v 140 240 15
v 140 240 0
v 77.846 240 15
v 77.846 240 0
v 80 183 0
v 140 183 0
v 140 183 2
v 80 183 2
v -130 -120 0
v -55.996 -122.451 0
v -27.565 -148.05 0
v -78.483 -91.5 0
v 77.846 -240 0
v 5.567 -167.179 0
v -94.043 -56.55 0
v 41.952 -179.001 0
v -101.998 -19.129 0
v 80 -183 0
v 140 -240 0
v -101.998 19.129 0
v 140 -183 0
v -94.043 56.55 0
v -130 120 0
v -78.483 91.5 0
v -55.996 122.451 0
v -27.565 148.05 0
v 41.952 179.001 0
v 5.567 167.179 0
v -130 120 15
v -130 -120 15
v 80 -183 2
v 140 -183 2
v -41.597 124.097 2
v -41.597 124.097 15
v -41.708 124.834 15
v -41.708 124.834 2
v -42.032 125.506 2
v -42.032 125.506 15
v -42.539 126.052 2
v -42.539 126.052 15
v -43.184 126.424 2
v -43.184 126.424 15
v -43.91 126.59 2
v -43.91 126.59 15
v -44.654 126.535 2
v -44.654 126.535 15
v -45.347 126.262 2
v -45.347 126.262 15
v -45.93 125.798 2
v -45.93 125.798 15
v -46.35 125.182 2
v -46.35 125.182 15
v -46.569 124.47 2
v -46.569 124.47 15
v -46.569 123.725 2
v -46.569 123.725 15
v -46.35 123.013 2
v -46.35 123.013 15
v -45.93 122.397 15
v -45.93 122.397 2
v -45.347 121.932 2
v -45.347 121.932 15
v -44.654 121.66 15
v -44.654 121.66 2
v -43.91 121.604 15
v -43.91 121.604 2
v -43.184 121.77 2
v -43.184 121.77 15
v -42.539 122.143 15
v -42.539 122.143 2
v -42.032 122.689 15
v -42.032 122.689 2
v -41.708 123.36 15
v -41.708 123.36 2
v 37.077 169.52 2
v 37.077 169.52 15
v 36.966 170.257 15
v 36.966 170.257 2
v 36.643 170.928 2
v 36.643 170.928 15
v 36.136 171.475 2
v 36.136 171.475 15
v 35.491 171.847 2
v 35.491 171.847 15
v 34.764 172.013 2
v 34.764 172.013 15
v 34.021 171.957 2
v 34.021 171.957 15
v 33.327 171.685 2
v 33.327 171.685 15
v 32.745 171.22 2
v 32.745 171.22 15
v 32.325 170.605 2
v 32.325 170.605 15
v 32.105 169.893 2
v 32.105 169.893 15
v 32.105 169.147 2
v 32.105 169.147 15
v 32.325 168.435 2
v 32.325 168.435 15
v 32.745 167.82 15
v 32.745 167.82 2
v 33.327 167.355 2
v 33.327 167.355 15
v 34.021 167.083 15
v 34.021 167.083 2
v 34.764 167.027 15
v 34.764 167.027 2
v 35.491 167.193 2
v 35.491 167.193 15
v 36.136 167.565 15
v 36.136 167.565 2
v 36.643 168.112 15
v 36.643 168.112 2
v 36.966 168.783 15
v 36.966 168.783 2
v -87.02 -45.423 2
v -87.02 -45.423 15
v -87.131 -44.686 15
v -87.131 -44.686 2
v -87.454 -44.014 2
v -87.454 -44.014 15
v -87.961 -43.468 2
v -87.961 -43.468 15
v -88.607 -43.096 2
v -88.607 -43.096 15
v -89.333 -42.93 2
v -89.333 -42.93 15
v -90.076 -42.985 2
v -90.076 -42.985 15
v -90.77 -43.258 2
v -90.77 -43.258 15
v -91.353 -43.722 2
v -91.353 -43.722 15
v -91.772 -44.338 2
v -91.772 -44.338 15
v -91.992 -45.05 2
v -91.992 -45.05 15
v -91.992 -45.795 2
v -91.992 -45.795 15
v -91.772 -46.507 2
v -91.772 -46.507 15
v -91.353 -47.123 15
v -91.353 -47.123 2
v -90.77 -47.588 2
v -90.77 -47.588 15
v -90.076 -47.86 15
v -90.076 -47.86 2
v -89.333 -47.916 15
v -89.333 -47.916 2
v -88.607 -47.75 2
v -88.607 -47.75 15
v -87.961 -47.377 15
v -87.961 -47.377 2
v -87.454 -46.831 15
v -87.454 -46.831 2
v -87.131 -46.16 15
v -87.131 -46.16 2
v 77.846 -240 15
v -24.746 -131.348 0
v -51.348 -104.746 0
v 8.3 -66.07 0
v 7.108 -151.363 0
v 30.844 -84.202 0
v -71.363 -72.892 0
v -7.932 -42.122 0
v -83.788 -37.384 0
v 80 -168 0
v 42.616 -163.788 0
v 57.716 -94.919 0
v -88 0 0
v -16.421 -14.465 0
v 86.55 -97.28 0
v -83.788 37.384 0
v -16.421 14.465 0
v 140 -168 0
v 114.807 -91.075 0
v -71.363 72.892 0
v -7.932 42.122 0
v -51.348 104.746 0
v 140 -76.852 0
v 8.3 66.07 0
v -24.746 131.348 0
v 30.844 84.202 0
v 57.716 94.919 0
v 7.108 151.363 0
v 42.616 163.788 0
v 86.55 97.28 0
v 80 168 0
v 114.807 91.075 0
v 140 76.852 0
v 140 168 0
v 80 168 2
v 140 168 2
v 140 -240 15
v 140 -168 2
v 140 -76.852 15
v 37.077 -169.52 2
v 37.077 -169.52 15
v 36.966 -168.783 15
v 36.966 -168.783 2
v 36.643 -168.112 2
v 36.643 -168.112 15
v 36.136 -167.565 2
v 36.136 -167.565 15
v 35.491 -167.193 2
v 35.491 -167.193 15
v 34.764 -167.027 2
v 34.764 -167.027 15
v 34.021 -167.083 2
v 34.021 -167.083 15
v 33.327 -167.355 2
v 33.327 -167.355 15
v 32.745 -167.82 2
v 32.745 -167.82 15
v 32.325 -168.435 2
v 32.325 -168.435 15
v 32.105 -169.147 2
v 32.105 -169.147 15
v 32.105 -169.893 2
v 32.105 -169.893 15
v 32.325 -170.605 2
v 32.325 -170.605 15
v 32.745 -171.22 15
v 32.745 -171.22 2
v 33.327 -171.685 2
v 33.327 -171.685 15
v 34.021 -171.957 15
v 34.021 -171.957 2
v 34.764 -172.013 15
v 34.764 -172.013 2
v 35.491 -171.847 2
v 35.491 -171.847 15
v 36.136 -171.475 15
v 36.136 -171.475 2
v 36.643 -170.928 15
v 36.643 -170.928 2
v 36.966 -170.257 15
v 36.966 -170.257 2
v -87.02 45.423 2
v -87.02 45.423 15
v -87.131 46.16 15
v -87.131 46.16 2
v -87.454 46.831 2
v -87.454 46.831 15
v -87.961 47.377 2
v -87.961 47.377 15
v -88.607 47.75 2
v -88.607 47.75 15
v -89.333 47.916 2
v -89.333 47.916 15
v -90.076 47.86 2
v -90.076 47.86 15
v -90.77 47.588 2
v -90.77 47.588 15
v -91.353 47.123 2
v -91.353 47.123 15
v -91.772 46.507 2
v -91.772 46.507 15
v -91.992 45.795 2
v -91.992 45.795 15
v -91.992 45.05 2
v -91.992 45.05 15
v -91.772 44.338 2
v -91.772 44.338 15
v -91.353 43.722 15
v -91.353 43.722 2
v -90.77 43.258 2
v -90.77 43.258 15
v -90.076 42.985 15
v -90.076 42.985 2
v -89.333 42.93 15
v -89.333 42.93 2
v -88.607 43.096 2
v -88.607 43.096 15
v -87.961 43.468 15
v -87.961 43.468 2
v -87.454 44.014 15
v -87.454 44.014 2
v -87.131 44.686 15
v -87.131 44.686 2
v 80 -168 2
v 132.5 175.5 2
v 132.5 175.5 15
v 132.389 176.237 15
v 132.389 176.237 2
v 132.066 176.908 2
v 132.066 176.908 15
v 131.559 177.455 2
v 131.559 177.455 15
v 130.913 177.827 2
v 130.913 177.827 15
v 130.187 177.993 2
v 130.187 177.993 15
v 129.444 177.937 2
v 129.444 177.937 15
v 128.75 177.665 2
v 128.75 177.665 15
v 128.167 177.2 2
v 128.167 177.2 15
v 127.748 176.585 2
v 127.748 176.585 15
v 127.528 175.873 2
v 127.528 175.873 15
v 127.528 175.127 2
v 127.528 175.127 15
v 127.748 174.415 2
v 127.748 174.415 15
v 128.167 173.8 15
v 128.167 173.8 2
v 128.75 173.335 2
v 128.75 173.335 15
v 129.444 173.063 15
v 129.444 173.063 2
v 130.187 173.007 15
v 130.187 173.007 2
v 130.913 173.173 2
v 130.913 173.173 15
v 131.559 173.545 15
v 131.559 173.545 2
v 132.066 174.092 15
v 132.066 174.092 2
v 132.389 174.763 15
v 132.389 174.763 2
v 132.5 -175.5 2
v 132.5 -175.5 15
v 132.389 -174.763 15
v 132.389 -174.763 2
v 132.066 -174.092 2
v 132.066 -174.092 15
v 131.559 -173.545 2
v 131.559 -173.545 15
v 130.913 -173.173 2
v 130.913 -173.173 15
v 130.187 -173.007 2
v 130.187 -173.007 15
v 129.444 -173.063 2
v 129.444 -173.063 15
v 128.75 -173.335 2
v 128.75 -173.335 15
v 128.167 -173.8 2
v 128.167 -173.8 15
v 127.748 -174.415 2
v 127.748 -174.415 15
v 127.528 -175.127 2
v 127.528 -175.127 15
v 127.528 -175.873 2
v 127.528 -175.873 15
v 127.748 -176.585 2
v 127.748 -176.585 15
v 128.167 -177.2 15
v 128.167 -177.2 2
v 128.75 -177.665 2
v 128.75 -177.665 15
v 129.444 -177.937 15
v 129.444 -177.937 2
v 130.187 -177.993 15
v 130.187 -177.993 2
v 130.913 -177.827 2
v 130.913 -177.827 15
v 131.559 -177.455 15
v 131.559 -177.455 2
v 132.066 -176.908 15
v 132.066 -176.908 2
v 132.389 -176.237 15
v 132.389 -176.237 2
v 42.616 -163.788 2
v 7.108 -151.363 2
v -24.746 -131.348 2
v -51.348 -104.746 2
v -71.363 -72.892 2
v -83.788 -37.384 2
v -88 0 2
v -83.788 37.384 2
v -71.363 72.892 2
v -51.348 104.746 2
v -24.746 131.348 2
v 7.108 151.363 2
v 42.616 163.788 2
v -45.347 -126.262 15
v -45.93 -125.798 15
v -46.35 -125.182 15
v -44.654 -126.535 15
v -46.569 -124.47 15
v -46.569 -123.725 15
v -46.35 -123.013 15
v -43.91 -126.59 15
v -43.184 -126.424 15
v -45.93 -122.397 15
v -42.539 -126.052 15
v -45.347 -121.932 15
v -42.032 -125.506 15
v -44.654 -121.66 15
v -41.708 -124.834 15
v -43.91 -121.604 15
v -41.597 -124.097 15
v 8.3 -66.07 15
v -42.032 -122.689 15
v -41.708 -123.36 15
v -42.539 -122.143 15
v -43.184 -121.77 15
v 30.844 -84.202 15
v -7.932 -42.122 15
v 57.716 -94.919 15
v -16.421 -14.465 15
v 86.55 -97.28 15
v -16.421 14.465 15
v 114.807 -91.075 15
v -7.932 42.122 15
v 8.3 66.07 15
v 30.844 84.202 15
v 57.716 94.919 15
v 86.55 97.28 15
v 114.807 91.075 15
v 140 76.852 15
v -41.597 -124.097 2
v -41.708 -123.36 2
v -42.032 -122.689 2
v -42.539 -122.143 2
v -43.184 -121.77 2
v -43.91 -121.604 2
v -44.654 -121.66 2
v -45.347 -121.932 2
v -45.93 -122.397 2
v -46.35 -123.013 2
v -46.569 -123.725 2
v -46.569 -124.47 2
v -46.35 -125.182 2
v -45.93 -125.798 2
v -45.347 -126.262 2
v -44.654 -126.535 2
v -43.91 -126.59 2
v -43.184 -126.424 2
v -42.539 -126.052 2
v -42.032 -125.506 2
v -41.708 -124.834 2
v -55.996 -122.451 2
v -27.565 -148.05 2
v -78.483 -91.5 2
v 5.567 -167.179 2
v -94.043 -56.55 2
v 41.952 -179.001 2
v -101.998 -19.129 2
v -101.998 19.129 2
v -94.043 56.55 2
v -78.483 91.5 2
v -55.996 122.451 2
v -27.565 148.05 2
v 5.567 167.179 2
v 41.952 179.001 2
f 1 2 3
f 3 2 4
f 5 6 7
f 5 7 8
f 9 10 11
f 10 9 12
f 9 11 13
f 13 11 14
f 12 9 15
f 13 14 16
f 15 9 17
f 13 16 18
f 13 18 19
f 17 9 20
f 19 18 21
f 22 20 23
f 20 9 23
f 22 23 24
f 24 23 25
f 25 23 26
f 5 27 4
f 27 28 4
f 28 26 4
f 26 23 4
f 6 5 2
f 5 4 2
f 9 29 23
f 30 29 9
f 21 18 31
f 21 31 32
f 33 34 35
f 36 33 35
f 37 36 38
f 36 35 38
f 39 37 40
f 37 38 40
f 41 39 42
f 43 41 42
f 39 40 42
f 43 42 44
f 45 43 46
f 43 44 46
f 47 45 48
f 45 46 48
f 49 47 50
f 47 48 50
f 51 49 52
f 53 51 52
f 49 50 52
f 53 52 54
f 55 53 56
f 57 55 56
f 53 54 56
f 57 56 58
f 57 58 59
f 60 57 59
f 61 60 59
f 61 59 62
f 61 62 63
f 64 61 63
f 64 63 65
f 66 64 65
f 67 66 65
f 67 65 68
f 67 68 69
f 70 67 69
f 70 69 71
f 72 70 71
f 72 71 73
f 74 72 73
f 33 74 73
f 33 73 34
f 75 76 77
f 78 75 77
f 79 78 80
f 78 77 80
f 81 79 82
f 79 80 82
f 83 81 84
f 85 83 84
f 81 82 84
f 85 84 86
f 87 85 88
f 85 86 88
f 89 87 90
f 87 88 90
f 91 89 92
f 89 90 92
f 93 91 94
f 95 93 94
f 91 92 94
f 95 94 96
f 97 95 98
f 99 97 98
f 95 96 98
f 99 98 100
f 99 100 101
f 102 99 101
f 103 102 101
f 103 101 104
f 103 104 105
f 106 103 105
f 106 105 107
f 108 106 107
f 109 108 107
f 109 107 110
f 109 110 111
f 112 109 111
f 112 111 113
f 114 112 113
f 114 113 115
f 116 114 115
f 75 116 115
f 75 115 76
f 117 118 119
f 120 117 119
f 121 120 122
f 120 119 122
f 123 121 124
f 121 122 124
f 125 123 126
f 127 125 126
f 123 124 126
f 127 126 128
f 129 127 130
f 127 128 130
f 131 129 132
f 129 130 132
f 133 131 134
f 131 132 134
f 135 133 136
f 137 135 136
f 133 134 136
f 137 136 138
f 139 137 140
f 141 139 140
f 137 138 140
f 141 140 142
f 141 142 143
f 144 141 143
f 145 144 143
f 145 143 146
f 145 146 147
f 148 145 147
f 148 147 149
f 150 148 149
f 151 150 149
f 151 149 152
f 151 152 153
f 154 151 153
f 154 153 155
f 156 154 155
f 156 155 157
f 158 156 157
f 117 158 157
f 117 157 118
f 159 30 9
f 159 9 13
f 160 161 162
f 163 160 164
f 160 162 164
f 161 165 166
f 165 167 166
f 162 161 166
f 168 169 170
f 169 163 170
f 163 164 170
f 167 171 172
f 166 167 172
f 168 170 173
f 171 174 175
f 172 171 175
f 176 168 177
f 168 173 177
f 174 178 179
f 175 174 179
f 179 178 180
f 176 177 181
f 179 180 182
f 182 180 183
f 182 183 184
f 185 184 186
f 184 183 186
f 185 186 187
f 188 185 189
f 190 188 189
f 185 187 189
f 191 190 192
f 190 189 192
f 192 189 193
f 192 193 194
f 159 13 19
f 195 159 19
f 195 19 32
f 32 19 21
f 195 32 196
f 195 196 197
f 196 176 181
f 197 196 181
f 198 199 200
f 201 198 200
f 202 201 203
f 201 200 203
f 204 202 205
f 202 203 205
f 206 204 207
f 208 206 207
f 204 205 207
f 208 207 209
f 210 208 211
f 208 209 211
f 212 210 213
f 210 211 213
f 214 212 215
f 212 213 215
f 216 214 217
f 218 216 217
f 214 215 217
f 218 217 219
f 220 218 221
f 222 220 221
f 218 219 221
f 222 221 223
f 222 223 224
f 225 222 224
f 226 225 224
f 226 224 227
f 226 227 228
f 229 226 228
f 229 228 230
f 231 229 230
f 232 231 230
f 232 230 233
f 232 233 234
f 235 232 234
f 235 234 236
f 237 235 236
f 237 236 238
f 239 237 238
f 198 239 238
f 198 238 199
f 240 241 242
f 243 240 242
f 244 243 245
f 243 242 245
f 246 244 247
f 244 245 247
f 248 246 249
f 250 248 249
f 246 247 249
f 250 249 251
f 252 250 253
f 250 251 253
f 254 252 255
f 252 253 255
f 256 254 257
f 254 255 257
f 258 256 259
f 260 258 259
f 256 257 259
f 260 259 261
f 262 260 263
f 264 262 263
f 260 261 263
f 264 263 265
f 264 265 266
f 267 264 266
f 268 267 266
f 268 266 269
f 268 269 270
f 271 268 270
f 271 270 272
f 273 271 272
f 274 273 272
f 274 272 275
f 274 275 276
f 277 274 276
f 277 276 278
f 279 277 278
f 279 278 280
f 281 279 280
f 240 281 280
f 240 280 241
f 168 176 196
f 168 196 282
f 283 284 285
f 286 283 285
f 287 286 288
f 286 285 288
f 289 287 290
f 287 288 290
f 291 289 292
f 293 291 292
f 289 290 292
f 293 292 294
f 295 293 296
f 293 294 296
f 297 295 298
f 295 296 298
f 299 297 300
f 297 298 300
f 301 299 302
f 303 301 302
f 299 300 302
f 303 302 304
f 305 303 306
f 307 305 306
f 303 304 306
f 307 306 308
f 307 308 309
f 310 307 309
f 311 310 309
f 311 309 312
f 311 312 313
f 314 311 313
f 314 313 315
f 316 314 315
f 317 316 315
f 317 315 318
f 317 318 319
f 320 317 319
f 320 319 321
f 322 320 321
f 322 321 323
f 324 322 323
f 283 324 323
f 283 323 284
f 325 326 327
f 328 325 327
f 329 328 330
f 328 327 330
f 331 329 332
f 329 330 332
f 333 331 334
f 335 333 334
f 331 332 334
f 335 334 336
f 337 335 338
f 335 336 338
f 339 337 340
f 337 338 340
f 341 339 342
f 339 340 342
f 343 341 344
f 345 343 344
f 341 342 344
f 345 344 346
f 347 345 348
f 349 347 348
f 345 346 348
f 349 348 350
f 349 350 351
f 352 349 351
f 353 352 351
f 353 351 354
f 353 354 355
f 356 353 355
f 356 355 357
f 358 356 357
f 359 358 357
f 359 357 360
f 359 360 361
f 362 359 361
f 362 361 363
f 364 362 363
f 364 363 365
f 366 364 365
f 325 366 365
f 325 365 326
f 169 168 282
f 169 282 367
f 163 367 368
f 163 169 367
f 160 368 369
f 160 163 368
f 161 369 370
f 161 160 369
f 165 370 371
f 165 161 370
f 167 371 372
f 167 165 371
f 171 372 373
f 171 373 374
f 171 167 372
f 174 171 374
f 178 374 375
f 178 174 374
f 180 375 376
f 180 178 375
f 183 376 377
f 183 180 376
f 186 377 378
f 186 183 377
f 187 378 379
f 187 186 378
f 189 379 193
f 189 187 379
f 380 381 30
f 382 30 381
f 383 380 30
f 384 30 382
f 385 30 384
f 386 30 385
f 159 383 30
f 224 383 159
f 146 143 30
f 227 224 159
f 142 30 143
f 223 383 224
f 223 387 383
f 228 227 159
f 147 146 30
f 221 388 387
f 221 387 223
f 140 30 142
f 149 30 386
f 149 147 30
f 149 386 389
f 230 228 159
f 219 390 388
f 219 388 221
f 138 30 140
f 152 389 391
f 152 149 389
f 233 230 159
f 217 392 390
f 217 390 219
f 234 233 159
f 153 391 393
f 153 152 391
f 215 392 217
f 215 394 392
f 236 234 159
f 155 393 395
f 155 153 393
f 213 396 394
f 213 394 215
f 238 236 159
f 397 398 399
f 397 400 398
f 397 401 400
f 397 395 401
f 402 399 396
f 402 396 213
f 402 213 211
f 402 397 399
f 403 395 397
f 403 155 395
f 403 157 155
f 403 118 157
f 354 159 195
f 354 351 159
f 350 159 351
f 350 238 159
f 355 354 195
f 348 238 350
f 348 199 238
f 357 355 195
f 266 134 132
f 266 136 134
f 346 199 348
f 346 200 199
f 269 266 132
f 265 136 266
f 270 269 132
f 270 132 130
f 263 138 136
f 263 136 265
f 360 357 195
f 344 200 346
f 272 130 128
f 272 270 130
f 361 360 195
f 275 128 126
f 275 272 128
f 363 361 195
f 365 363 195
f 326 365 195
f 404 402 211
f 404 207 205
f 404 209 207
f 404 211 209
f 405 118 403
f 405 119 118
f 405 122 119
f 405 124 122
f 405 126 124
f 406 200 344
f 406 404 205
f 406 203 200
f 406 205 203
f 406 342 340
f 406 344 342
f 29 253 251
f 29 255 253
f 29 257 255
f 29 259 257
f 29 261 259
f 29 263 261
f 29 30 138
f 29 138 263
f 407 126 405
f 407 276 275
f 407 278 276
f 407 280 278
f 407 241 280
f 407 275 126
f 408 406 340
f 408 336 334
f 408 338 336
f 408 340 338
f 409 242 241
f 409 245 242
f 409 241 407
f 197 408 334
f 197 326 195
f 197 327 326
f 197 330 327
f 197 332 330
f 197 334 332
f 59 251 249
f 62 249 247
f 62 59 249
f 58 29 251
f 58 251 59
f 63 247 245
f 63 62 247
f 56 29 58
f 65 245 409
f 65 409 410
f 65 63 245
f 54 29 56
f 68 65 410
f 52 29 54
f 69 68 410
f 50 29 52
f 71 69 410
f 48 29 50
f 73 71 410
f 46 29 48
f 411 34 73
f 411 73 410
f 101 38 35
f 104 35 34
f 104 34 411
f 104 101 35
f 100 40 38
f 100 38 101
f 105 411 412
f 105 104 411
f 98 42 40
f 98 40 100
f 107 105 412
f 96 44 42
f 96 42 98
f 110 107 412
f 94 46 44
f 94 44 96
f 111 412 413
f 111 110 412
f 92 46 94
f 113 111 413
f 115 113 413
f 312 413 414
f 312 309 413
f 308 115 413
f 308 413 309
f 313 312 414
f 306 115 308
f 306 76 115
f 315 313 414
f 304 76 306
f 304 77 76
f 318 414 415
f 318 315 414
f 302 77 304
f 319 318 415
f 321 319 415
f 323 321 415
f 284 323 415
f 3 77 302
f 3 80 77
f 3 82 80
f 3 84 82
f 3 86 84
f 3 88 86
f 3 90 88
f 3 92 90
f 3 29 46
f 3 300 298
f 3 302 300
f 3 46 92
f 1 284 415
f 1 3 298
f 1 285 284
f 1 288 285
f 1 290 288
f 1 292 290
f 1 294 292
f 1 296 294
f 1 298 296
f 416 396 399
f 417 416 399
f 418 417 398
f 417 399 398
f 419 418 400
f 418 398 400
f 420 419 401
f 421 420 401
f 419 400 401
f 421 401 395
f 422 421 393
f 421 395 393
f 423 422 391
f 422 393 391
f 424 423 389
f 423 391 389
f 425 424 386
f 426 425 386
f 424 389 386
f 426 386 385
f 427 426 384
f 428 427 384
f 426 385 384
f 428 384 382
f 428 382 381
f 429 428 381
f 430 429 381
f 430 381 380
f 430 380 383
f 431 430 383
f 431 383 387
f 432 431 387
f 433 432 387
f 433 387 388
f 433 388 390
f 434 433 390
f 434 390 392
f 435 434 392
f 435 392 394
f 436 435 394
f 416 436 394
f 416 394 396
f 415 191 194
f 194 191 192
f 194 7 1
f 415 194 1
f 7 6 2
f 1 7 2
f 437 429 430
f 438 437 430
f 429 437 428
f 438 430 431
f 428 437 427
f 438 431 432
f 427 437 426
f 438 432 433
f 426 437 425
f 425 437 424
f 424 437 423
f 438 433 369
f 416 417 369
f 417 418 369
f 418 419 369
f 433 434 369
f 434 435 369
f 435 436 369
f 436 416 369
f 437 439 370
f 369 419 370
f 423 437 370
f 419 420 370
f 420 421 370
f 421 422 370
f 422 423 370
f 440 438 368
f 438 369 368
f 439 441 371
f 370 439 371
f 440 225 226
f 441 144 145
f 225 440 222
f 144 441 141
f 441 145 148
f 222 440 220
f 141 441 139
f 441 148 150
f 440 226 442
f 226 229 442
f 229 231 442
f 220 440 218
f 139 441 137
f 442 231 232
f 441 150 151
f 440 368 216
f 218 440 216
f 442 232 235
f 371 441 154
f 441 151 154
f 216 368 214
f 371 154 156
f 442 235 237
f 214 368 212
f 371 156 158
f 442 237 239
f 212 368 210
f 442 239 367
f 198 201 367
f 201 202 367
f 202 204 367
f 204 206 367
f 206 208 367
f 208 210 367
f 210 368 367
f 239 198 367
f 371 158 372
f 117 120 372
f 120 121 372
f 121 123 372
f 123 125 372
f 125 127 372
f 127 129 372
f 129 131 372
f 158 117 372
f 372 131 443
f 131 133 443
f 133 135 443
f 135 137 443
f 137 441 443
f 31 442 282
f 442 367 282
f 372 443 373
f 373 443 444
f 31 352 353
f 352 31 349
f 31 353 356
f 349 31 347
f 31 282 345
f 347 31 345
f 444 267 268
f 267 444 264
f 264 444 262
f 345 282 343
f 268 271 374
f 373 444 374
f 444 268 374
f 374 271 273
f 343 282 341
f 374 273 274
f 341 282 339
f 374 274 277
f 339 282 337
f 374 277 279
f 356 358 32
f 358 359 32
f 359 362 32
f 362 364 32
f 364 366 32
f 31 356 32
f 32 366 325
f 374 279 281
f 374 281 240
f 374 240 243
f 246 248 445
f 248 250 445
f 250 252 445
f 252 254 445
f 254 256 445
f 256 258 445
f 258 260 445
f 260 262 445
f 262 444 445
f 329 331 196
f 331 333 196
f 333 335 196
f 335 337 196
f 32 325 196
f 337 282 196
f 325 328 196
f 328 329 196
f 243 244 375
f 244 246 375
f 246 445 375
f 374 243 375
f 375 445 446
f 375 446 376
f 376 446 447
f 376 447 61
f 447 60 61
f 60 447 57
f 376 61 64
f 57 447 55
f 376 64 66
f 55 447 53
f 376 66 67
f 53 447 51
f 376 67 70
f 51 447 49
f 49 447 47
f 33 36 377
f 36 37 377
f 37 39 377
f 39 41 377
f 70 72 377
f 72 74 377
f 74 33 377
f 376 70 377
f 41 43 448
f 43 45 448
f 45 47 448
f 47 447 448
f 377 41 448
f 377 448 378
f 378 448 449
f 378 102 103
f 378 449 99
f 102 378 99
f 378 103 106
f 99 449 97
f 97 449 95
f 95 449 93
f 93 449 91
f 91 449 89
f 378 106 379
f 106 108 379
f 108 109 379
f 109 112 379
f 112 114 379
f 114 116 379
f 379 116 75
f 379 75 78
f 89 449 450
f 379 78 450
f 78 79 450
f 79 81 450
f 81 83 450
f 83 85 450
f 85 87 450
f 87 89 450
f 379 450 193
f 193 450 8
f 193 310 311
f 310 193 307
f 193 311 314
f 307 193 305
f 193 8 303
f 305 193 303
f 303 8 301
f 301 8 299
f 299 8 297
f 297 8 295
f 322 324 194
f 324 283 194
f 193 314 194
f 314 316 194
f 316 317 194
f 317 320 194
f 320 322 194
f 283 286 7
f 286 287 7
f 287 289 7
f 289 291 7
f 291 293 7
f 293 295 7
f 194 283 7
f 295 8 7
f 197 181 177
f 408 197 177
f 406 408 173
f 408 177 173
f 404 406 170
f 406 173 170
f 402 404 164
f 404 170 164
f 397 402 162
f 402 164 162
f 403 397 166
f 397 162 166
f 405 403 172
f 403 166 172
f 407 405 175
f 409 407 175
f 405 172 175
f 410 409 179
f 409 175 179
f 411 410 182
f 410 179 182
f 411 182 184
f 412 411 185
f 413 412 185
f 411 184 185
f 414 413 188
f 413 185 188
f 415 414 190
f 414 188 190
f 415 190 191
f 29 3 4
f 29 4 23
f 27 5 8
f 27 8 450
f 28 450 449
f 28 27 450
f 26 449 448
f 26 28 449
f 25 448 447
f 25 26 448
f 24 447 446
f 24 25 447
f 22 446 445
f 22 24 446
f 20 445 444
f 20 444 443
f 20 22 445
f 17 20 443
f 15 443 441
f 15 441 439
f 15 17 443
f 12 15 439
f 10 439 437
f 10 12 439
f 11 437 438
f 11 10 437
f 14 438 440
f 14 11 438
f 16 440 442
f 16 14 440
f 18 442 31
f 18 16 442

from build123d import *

# Parameters (mm, degrees)
EXTRUDE_1_DEPTH          = 15
CUT_EXTRUDE_2_DEPTH      = 2
SKETCH_2_R               = 97.5
CUT_EXTRUDE_3_DEPTH      = 279.25348156
CUT_EXTRUDE_4_DEPTH      = 279.25348156
CUT_EXTRUDE_4_DEPTH_BACK = 279.25348156
HOLE_WIZARD_M6_1_D       = 5


with BuildPart() as part:
    # 草图1 → 凸台-拉伸1 (new body)
    with BuildSketch(Plane.XY):
        with BuildLine():
            Line((140, 183), (140, 240))
            Line((140, 240), (-140, 240))
            Line((-140, 240), (-140, -240))
            Line((-140, -240), (140, -240))
            Line((140, -240), (140, -183))
            Line((140, -183), (80, -183))
            ThreePointArc((80, -183), (-103, 0), (80, 183))
            Line((80, 183), (140, 183))
        make_face()
        with BuildLine():
            Line((140, -168), (140, 168))
            Line((140, 168), (80, 168))
            ThreePointArc((80, 168), (-88, 0), (80, -168))
            Line((80, -168), (140, -168))
        make_face()
        with BuildLine():
            Line((140, 168), (140, 183))
            Line((140, 183), (80, 183))
            ThreePointArc((80, 183), (-103, 0), (80, -183))
            Line((80, -183), (140, -183))
            Line((140, -183), (140, -168))
            Line((140, -168), (80, -168))
            ThreePointArc((80, -168), (-88, 0), (80, 168))
            Line((80, 168), (140, 168))
        make_face()
    extrude(amount=EXTRUDE_1_DEPTH)

    # 草图1<4> → 切除-拉伸2 (cut)
    with BuildSketch(Plane.XY):
        with BuildLine():
            Line((140, 168), (140, 183))
            Line((140, 183), (80, 183))
            ThreePointArc((80, 183), (-103, 0), (80, -183))
            Line((80, -183), (140, -183))
            Line((140, -183), (140, -168))
            Line((140, -168), (80, -168))
            ThreePointArc((80, -168), (-88, 0), (80, 168))
            Line((80, 168), (140, 168))
        make_face()
    extrude(amount=CUT_EXTRUDE_2_DEPTH, mode=Mode.SUBTRACT)

    # 草图2 → 切除-拉伸3 (cut, through all)
    with BuildSketch(Plane(origin=(0, 0, 0), x_dir=(-1, 0, 0), z_dir=(0, 0, -1))):
        with Locations((-80, 0)):
            Circle(SKETCH_2_R)
    extrude(amount=-CUT_EXTRUDE_3_DEPTH, mode=Mode.SUBTRACT)

    # 草图3 → 切除-拉伸4 (cut, two sides: drawn at the far end of the back side and taken through both)
    with BuildSketch(Plane(origin=(0, 0, 0), x_dir=(-1, 0, 0), z_dir=(0, 0, -1)).offset(-CUT_EXTRUDE_4_DEPTH_BACK)):
        Polygon((140, 240), (-77.846096908, 240), (130, 120), (130, -120), (-77.846096908, -240), (140, -240), align=None)
    extrude(amount=CUT_EXTRUDE_4_DEPTH + CUT_EXTRUDE_4_DEPTH_BACK, mode=Mode.SUBTRACT)

    # M6 螺纹孔1 (through all)
    with Locations(Plane(origin=(0, 0, 2), x_dir=(-1, 0, 0), z_dir=(0, 0, -1))):
        with Locations((-34.577257585, -169.519982514), (44.097240098, -124.097240098), (89.519982514, -45.422742415), (89.519982514, 45.422742415), (44.097240098, 124.097240098), (-34.577257585, 169.519982514), (-130, 175.5), (-130, -175.5)):
            Hole(HOLE_WIZARD_M6_1_D / 2)


solid = part.part
